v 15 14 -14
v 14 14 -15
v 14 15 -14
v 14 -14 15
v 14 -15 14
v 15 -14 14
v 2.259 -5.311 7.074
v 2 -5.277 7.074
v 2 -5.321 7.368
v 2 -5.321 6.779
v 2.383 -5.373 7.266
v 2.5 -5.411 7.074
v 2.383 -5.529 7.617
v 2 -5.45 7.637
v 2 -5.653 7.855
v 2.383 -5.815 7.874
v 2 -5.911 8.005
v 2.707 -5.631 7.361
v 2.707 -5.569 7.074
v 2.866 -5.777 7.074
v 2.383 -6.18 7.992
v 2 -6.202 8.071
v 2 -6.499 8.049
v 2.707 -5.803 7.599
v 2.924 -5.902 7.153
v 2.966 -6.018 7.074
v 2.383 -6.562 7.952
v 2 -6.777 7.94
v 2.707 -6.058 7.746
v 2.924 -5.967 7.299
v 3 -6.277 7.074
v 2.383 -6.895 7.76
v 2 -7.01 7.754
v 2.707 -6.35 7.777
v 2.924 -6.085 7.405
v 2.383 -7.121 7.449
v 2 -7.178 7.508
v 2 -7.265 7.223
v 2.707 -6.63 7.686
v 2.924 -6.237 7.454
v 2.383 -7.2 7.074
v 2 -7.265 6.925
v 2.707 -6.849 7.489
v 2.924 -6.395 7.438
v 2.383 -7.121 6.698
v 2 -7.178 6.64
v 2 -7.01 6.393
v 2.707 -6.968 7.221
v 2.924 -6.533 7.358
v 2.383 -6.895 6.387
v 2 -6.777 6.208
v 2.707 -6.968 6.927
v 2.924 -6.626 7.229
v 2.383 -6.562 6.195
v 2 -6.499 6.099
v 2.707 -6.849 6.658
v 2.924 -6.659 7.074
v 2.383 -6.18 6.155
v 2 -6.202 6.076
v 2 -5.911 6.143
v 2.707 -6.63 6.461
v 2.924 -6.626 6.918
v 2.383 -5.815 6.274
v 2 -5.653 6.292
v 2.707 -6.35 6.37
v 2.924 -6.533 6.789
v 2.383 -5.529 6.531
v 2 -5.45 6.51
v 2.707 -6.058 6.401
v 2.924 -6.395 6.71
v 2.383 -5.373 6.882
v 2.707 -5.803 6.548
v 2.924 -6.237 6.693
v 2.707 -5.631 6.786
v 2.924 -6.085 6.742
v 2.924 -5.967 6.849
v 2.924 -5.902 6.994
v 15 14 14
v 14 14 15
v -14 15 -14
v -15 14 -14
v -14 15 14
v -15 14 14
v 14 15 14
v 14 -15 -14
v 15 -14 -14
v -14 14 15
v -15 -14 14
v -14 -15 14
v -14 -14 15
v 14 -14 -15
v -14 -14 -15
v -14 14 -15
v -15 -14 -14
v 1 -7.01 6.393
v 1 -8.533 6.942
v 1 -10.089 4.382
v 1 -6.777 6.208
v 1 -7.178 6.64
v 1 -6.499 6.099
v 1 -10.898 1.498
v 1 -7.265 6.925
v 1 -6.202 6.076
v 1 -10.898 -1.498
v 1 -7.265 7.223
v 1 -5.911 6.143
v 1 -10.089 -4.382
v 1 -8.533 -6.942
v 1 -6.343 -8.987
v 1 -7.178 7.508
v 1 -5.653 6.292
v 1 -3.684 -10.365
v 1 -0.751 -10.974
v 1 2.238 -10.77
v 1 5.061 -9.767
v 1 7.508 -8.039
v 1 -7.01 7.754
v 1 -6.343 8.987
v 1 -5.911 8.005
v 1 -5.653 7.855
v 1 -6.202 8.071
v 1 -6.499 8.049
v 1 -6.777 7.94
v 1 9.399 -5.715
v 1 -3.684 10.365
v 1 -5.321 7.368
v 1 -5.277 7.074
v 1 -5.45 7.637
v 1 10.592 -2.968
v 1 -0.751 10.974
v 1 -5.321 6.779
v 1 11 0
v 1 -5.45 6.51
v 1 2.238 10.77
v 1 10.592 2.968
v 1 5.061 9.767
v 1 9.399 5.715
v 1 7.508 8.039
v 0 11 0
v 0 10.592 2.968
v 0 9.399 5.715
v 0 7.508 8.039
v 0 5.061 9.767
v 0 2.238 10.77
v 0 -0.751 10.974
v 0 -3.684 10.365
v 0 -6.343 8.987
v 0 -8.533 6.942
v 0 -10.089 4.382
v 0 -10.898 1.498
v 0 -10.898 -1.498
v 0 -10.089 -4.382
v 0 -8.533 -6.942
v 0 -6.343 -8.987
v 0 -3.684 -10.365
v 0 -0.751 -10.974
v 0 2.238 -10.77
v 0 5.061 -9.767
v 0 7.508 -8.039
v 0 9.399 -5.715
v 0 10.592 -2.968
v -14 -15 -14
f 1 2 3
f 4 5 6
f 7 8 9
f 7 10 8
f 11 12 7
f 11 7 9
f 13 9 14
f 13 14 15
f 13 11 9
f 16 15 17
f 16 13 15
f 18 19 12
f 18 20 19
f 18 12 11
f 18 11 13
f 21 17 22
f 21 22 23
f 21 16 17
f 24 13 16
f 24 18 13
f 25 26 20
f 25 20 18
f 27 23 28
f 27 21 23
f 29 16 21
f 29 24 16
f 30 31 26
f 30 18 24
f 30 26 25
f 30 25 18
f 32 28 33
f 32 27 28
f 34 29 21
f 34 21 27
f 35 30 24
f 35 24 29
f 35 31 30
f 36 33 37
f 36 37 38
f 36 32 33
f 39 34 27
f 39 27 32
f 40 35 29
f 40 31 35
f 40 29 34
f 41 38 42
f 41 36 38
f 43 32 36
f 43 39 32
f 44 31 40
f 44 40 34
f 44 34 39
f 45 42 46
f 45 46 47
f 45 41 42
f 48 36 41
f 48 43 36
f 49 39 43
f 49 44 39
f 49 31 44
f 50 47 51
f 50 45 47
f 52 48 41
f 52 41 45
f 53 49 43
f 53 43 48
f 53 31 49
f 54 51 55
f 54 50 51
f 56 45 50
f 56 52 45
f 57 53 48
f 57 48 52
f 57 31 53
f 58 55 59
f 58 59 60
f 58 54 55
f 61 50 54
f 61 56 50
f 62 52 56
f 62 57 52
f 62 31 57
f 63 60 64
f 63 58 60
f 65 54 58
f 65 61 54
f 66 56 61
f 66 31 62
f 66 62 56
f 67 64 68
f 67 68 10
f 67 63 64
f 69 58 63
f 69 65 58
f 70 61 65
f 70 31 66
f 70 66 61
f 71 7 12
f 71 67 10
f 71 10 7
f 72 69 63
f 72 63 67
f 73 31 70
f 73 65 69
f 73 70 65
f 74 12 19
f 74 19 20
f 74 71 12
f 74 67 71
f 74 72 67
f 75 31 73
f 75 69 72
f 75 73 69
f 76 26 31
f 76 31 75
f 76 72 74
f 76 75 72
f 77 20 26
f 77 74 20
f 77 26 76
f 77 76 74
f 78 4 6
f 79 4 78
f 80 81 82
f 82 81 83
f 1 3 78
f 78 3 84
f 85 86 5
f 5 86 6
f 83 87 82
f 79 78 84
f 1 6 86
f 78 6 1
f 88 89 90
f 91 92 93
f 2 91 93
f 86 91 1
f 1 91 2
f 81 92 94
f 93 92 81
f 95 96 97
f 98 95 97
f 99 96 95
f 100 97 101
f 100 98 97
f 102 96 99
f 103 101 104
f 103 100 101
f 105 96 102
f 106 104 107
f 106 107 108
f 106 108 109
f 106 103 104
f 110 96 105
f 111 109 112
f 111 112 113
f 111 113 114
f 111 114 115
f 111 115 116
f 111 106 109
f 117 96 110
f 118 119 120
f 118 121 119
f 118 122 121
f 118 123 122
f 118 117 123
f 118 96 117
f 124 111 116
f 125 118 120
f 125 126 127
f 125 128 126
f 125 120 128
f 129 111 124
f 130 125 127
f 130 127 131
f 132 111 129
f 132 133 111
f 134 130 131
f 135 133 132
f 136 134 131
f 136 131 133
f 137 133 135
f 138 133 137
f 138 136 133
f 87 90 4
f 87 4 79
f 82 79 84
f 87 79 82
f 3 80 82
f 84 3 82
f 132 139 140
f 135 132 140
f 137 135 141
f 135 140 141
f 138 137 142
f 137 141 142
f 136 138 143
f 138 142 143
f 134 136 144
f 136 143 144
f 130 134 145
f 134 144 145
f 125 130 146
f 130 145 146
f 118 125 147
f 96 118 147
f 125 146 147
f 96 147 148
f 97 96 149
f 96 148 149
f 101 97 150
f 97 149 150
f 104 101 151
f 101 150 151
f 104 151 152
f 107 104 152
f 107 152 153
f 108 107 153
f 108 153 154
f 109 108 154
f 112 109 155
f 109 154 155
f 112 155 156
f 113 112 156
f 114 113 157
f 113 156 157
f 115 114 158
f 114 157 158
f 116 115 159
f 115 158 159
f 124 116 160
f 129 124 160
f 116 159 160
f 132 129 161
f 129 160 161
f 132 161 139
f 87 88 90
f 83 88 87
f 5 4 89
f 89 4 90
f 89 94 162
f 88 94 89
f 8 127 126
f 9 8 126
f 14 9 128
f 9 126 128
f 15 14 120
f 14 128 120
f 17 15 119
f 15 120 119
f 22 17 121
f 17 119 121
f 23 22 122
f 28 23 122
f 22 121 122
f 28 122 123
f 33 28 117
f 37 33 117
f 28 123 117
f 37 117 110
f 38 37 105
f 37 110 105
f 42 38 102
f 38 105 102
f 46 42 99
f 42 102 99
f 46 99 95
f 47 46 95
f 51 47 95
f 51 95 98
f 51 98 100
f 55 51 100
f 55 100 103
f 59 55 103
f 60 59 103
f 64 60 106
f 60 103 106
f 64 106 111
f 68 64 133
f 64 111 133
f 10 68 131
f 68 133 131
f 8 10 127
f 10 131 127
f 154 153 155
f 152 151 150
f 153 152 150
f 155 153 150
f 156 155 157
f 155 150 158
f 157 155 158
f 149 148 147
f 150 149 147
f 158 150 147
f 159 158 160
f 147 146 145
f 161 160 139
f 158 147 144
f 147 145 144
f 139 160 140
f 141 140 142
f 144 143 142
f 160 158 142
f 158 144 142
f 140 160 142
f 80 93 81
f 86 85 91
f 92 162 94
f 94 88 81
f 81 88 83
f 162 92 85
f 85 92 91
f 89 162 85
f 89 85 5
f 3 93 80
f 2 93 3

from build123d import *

# Parameters (mm, degrees)
F0_R     = 11
F1_DEPTH = 1
F2_R     = 1
F3_DEPTH = 2
F4_R     = 1
F5_W     = 30
F5_H     = 30
F6_DEPTH = 15
F7_SIZE  = 1


with BuildPart() as f1:
    # F0 (on Right) → F1 (new body)
    with BuildSketch(Plane.YZ):
        Circle(F0_R)
    extrude(amount=F1_DEPTH)

    # F2 (on face) → F3 (join)
    with BuildSketch(Plane.YZ.offset(1)):
        with Locations((-6.276546, 7.073645)):
            Circle(F2_R)
    extrude(amount=F3_DEPTH)

    # F4
    f4_edges = [f1.edges().sort_by_distance(p)[0] for p in [
        (3, -7.276546, 7.073645),
    ]]
    fillet(f4_edges, radius=F4_R)


with BuildPart() as f6:
    # F5 (on Right) → F6 (new body, symmetric)
    with BuildSketch(Plane.YZ):
        Rectangle(F5_W, F5_H)
    extrude(amount=F6_DEPTH, both=True)

    # F7
    f7_edges = [f6.edges().sort_by_distance(p)[0] for p in [
        (0, -15, -15),
        (15, -15, 0),
        (0, -15, 15),
        (-15, -15, 0),
        (-15, 0, -15),
        (15, 0, -15),
        (0, 15, -15),
        (15, 15, 0),
        (15, 0, 15),
        (0, 15, 15),
        (-15, 0, 15),
        (-15, 15, 0),
    ]]
    chamfer(f7_edges, length=F7_SIZE)


solid = Compound([f1.part, f6.part])
